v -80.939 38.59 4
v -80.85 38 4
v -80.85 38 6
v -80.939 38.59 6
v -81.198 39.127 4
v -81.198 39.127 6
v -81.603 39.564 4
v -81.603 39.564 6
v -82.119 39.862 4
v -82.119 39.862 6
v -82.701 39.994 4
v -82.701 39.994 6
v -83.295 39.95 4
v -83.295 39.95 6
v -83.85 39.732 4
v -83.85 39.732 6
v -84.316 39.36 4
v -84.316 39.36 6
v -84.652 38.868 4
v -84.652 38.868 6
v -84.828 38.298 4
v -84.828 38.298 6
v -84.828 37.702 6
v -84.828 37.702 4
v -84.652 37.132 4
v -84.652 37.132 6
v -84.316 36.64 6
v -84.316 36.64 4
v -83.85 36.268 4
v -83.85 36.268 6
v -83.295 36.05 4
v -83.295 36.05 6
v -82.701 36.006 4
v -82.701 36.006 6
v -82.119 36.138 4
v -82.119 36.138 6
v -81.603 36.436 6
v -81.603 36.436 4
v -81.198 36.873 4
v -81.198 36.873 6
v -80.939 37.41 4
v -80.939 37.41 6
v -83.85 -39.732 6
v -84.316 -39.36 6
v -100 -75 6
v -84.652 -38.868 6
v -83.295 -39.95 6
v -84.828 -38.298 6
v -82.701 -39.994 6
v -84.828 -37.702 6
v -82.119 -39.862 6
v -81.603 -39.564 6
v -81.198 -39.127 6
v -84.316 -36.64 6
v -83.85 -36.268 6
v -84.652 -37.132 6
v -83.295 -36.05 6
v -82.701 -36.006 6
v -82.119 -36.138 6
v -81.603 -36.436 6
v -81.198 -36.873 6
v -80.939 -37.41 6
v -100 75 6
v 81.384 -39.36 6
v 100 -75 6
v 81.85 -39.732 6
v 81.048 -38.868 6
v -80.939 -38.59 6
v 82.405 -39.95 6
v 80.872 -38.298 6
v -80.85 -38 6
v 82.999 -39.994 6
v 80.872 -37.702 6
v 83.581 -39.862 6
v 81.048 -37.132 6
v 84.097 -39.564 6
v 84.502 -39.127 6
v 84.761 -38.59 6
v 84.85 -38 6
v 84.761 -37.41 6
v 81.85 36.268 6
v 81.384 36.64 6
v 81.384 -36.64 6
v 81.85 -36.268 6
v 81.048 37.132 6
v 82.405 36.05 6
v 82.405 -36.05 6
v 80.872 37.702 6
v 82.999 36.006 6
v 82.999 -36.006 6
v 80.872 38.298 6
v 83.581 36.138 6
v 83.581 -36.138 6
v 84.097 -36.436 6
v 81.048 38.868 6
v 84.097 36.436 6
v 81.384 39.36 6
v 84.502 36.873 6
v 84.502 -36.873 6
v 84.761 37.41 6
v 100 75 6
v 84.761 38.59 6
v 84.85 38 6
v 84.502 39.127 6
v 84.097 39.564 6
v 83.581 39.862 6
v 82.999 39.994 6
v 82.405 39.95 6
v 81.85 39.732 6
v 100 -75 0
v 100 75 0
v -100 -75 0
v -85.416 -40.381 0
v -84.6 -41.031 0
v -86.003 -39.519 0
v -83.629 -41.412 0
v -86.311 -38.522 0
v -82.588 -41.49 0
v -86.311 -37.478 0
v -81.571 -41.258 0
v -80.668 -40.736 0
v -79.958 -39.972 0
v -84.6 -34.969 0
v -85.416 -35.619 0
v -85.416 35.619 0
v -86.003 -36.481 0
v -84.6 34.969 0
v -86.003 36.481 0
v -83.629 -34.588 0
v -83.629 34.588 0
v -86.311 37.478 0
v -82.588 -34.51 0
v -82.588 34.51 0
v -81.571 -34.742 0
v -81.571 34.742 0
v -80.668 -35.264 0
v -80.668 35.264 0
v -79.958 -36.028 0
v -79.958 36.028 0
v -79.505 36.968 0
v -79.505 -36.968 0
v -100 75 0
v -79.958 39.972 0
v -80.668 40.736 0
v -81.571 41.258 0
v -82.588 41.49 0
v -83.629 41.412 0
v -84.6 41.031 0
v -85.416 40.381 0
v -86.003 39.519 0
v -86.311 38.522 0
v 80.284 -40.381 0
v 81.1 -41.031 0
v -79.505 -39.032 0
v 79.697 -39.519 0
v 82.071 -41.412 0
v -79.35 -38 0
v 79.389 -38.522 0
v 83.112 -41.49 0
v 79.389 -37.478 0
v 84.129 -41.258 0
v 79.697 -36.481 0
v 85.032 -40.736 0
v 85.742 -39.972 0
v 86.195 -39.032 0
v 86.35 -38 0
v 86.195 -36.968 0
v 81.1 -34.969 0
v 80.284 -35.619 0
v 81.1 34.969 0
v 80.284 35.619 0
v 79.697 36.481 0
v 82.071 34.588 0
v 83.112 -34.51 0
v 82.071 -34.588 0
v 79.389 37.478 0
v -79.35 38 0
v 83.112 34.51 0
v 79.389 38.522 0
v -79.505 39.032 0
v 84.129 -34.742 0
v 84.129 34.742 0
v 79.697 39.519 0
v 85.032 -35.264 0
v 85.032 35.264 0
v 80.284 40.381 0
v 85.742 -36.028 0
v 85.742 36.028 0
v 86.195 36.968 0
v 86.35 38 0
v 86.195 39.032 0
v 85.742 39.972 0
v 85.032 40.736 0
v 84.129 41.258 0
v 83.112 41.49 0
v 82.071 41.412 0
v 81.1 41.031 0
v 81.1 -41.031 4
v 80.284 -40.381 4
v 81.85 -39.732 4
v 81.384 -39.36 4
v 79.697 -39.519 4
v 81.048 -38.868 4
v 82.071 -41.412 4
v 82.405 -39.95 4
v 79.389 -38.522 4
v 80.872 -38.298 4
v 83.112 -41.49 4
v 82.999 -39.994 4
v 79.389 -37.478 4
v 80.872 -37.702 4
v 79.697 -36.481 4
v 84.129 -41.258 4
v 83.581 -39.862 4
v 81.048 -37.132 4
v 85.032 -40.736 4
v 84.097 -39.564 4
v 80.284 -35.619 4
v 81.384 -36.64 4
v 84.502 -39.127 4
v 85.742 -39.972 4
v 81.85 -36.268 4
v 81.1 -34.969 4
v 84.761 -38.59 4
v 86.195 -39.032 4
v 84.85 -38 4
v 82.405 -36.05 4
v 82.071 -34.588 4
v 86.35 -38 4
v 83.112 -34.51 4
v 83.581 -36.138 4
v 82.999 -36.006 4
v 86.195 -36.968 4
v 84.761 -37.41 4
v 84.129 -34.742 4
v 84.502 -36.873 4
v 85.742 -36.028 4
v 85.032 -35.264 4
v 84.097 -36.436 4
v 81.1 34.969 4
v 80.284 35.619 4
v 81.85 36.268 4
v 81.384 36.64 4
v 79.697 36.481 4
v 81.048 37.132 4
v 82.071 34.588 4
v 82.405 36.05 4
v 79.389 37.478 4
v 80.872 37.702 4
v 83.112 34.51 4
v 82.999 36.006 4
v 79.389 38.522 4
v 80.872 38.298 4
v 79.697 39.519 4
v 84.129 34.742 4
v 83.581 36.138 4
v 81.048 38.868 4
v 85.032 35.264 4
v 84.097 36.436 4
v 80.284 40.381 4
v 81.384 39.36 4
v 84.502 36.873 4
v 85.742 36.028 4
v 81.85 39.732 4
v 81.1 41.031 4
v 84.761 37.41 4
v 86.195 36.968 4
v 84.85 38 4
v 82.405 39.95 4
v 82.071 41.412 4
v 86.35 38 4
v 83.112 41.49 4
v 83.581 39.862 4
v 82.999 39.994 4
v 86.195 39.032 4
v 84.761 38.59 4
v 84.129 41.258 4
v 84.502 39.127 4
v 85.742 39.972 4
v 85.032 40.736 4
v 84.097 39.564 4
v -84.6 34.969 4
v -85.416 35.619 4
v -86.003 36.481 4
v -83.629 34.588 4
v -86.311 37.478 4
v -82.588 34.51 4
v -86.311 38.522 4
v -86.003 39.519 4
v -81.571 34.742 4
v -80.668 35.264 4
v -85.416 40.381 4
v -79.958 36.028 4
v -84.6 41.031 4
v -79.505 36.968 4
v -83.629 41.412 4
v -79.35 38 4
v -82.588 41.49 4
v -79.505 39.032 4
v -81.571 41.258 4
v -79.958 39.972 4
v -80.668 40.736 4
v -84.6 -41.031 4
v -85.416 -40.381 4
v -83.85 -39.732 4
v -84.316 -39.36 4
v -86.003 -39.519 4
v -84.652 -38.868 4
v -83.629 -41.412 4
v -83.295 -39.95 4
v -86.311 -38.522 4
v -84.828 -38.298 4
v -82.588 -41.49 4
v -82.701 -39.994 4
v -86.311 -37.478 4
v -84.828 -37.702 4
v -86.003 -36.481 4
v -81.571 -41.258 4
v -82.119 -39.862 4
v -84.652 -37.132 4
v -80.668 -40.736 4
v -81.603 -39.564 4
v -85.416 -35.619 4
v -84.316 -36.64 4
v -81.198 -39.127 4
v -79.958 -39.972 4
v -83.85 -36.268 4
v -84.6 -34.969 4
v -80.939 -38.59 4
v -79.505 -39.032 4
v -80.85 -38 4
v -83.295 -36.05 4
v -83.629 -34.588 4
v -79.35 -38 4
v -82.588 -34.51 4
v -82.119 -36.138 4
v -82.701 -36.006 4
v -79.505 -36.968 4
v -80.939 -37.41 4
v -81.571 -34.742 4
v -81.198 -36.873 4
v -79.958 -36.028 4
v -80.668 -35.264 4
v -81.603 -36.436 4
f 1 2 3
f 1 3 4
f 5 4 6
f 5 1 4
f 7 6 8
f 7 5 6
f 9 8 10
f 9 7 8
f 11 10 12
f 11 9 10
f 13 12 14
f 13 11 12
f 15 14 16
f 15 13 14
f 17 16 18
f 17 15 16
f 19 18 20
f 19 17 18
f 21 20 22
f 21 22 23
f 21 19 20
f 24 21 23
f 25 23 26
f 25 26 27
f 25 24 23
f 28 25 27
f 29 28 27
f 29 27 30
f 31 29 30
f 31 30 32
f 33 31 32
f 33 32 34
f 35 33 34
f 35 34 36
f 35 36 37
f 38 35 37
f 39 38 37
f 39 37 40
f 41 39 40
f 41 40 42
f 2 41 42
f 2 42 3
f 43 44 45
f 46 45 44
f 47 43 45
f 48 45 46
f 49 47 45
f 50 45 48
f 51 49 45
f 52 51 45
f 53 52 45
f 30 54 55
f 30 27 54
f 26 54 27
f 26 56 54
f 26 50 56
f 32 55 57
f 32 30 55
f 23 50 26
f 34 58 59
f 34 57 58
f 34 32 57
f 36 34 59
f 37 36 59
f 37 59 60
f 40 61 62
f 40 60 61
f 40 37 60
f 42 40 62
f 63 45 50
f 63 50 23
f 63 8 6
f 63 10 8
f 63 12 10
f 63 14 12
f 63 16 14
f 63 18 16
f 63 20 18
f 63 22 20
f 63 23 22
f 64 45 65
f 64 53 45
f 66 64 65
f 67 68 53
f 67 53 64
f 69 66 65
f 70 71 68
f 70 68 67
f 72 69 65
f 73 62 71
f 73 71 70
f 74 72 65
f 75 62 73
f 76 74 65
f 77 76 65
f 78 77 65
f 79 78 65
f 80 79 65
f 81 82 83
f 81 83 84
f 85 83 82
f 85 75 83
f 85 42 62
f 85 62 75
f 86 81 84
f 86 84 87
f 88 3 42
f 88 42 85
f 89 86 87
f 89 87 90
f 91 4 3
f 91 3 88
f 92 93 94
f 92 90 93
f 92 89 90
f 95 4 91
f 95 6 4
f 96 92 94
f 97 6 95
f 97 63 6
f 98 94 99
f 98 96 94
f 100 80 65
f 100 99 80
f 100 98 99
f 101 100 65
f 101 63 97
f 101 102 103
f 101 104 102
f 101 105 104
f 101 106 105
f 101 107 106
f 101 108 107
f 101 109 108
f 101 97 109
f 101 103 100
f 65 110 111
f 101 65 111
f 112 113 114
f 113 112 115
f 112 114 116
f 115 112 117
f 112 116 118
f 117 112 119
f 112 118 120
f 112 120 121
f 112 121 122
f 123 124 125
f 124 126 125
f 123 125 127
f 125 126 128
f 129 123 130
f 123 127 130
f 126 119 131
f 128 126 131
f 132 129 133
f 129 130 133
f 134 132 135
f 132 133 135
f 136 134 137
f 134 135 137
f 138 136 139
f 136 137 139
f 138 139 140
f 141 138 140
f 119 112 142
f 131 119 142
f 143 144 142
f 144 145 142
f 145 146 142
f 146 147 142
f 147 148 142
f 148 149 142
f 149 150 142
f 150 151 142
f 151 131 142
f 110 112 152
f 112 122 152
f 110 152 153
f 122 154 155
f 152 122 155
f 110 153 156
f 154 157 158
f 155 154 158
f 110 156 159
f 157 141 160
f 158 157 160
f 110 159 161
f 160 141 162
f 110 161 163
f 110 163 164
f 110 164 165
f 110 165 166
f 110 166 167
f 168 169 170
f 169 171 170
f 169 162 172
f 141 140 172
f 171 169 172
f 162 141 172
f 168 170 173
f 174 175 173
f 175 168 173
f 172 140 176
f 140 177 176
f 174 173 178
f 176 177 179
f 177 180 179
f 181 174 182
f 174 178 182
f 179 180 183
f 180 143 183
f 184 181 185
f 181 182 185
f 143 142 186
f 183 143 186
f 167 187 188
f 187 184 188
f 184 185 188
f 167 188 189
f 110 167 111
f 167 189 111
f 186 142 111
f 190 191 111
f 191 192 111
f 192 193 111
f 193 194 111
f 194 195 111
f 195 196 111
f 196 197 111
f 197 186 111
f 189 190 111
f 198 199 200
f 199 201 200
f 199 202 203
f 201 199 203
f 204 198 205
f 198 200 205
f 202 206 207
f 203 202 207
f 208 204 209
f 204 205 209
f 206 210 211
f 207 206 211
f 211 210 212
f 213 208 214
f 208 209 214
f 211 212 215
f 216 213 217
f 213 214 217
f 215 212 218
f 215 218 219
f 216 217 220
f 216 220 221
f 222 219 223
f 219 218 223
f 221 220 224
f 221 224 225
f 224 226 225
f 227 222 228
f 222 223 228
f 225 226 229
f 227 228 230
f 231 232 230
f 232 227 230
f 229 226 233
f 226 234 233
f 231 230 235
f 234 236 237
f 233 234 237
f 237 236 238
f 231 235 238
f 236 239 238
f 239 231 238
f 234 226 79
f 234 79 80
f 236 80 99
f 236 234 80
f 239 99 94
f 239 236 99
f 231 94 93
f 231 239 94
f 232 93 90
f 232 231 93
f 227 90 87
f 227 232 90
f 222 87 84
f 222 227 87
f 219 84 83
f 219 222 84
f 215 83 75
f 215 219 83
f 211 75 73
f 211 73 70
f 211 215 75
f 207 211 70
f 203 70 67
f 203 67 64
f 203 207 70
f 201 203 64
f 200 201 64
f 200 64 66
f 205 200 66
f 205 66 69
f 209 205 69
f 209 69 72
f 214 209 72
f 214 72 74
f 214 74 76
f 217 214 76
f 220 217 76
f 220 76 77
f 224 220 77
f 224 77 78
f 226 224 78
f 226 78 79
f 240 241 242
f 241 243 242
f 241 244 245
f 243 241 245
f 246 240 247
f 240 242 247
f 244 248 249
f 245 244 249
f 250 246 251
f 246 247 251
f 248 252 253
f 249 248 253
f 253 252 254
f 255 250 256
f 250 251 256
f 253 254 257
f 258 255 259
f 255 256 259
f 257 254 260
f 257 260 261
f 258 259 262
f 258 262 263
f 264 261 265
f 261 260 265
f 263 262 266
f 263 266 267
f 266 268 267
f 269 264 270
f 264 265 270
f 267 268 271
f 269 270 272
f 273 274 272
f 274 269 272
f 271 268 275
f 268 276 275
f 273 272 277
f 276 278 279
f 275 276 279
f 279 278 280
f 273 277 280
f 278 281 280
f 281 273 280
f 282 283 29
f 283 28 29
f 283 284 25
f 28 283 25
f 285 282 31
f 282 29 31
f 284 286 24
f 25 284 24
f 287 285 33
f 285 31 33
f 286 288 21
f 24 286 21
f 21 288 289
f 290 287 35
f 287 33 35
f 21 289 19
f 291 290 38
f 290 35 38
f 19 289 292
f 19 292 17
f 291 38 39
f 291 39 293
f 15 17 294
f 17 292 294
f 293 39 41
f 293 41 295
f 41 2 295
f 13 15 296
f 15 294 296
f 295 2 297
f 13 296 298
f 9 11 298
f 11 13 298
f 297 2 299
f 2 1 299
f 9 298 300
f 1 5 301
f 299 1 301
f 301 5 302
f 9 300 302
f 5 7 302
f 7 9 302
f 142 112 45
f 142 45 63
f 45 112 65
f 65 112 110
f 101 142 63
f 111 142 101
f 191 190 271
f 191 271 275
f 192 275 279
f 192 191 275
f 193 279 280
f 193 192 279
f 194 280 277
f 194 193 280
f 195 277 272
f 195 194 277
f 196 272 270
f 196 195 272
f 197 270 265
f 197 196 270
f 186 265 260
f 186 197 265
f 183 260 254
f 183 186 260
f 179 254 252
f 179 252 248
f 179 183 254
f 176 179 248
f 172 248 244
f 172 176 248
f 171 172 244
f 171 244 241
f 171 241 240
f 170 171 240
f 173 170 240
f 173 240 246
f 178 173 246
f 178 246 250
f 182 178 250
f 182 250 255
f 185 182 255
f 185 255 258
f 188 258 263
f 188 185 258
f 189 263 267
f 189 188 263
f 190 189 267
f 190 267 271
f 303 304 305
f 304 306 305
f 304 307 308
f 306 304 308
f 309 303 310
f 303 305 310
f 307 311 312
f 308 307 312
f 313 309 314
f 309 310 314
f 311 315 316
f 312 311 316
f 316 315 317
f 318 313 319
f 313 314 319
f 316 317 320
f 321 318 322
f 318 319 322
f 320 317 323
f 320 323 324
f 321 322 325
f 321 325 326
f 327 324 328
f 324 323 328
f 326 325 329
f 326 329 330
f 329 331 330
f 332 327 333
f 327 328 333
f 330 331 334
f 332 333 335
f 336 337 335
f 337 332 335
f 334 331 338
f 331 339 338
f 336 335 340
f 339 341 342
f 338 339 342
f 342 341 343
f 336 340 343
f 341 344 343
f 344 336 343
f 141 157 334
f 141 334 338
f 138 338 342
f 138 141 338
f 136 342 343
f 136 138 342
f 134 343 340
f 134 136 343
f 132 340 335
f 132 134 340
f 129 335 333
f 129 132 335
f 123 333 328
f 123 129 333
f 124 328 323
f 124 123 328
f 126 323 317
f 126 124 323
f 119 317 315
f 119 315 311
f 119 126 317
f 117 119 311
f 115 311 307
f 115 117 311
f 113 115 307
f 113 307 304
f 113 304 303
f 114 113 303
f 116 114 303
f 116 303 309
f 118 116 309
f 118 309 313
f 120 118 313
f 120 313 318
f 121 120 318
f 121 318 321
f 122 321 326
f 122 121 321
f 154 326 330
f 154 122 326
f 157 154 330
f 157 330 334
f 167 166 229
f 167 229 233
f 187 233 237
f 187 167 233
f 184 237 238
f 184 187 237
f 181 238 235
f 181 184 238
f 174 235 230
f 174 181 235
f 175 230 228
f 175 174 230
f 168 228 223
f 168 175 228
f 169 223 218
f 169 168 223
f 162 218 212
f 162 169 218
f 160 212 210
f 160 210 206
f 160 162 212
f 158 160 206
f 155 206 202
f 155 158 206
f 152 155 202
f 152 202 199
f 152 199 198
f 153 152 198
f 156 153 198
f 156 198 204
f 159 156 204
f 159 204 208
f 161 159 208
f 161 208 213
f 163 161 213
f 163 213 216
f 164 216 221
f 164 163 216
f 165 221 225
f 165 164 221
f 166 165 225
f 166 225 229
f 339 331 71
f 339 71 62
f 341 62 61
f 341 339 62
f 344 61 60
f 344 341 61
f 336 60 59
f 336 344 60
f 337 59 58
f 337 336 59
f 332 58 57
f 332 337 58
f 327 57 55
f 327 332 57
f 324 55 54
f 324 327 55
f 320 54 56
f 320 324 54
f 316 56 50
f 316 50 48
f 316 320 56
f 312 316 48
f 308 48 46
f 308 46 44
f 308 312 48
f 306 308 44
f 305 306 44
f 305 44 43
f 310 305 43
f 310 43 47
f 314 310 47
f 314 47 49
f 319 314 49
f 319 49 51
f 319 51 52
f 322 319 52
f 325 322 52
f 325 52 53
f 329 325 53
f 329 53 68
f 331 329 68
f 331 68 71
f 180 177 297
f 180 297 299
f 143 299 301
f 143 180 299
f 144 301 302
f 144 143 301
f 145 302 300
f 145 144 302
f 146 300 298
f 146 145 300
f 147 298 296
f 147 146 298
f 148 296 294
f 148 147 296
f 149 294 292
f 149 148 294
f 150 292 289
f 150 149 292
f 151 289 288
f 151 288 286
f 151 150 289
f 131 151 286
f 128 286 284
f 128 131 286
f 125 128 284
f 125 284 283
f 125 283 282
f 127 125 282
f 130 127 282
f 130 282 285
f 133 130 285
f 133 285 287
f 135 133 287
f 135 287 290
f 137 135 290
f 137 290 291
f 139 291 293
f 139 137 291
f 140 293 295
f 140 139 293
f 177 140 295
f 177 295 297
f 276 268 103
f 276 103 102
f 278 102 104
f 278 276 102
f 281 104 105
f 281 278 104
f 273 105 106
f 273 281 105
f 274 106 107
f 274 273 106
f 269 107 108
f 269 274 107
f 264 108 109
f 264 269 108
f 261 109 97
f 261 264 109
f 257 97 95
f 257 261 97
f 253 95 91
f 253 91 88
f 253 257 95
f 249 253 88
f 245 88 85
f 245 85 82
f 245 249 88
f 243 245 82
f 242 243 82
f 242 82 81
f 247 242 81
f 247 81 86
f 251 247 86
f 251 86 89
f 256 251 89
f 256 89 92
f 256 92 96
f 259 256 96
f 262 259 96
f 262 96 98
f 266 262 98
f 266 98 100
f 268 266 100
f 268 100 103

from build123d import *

# Parameters (mm, degrees)
F0_W     = 200
F0_H     = 150
F0_R     = 3.5
F0_R_2   = 2
F1_DEPTH = 6
F2_DEPTH = 4


with BuildPart() as f1:
    # F0 (on Top) → F1 (new body)
    with BuildSketch(Plane.XY):
        Rectangle(F0_W, F0_H)
        with Locations((-82.85, -38)):
            Circle(F0_R, mode=Mode.SUBTRACT)
        with Locations((82.85, -38)):
            Circle(F0_R, mode=Mode.SUBTRACT)
        with Locations((-82.85, 38)):
            Circle(F0_R, mode=Mode.SUBTRACT)
        with Locations((82.85, 38)):
            Circle(F0_R, mode=Mode.SUBTRACT)
        with Locations((-82.85, 38)):
            Circle(F0_R)
        with Locations((-82.85, 38)):
            Circle(F0_R_2, mode=Mode.SUBTRACT)
        with Locations((82.85, -38)):
            Circle(F0_R)
        with Locations((82.85, -38)):
            Circle(F0_R_2, mode=Mode.SUBTRACT)
        with Locations((82.85, 38)):
            Circle(F0_R)
        with Locations((82.85, 38)):
            Circle(F0_R_2, mode=Mode.SUBTRACT)
        with Locations((-82.85, -38)):
            Circle(F0_R)
        with Locations((-82.85, -38)):
            Circle(F0_R_2, mode=Mode.SUBTRACT)
    extrude(amount=F1_DEPTH)

    # F0 (on Top) → F2 (cut)
    with BuildSketch(Plane.XY):
        with Locations((-82.85, 38)):
            Circle(F0_R)
        with Locations((-82.85, 38)):
            Circle(F0_R_2, mode=Mode.SUBTRACT)
        with Locations((82.85, 38)):
            Circle(F0_R)
        with Locations((82.85, 38)):
            Circle(F0_R_2, mode=Mode.SUBTRACT)
        with Locations((82.85, -38)):
            Circle(F0_R)
        with Locations((82.85, -38)):
            Circle(F0_R_2, mode=Mode.SUBTRACT)
        with Locations((-82.85, -38)):
            Circle(F0_R)
        with Locations((-82.85, -38)):
            Circle(F0_R_2, mode=Mode.SUBTRACT)
    extrude(amount=F2_DEPTH, mode=Mode.SUBTRACT)


solid = f1.part
